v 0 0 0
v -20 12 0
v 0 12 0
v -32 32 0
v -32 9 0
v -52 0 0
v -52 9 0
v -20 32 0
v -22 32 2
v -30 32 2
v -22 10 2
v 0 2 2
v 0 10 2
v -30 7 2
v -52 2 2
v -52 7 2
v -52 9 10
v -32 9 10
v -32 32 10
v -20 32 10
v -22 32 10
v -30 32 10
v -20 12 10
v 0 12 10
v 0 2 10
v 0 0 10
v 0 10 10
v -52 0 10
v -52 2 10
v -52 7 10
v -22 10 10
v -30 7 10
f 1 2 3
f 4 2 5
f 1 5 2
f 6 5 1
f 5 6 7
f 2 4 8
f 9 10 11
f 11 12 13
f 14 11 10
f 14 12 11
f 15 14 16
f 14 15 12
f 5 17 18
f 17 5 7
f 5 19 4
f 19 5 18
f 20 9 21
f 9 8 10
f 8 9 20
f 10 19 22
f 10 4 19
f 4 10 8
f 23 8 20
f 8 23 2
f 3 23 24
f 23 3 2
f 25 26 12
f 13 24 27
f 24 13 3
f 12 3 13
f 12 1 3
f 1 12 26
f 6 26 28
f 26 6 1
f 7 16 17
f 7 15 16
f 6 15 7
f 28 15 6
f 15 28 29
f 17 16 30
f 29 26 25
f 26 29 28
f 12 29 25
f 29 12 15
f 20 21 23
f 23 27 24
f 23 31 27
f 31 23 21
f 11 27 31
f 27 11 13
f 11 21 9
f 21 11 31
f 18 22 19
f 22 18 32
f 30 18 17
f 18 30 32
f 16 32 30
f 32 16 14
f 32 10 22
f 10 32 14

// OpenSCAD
largeWidth = 8;
thinWidth = 5;

shell = 2;
depth = 10;

largeBaseWidth = largeWidth + 2 * shell;
thinBaseWidth = thinWidth + 2 * shell;

legLength = 20;
totalLenght = 2* legLength + largeBaseWidth;

rightHandClip();

module rightHandClip() {
    mirror([1,0,0]) leftHandClip() ;
}

module leftHandClip() {

linear_extrude(shell)
polygon (
    [
        [0,0],
        [totalLenght,0],
        [totalLenght,thinBaseWidth],
        [legLength + largeBaseWidth ,thinBaseWidth],
        [legLength + largeBaseWidth,legLength + largeBaseWidth],
        [legLength,legLength + largeBaseWidth],
        [legLength,largeBaseWidth],
        [0,largeBaseWidth]
    ]
);

translate([totalLenght, 0,0]) rotate([0,0,90]) wall(totalLenght);
translate([legLength + 2, largeBaseWidth - shell,0]) rotate([0,0,90]) legWall();
translate([2* legLength + largeBaseWidth, thinBaseWidth - shell,0]) rotate([0,0,90]) legWall();
translate([legLength, largeBaseWidth - shell, 0])legWall();

#translate([legLength+ largeBaseWidth - shell, thinBaseWidth - shell, 0]) wall(largeBaseWidth - thinBaseWidth + legLength + shell);


}

module legWall() {
    wall(legLength + shell);
}

module base(width) {
    union() { 
        cube([width, legLength + shell, shell]);
        //translate([0, shell,0]) wall(legLength);
        //translate([width - shell, shell,0]) wall(legLength);
    }
}


module wall(length) {
    cube([shell, length, depth]);
}

module largeBase() {
    base(largeBaseWidth);
}


module thinBase() {
    base(thinBaseWidth);
}
